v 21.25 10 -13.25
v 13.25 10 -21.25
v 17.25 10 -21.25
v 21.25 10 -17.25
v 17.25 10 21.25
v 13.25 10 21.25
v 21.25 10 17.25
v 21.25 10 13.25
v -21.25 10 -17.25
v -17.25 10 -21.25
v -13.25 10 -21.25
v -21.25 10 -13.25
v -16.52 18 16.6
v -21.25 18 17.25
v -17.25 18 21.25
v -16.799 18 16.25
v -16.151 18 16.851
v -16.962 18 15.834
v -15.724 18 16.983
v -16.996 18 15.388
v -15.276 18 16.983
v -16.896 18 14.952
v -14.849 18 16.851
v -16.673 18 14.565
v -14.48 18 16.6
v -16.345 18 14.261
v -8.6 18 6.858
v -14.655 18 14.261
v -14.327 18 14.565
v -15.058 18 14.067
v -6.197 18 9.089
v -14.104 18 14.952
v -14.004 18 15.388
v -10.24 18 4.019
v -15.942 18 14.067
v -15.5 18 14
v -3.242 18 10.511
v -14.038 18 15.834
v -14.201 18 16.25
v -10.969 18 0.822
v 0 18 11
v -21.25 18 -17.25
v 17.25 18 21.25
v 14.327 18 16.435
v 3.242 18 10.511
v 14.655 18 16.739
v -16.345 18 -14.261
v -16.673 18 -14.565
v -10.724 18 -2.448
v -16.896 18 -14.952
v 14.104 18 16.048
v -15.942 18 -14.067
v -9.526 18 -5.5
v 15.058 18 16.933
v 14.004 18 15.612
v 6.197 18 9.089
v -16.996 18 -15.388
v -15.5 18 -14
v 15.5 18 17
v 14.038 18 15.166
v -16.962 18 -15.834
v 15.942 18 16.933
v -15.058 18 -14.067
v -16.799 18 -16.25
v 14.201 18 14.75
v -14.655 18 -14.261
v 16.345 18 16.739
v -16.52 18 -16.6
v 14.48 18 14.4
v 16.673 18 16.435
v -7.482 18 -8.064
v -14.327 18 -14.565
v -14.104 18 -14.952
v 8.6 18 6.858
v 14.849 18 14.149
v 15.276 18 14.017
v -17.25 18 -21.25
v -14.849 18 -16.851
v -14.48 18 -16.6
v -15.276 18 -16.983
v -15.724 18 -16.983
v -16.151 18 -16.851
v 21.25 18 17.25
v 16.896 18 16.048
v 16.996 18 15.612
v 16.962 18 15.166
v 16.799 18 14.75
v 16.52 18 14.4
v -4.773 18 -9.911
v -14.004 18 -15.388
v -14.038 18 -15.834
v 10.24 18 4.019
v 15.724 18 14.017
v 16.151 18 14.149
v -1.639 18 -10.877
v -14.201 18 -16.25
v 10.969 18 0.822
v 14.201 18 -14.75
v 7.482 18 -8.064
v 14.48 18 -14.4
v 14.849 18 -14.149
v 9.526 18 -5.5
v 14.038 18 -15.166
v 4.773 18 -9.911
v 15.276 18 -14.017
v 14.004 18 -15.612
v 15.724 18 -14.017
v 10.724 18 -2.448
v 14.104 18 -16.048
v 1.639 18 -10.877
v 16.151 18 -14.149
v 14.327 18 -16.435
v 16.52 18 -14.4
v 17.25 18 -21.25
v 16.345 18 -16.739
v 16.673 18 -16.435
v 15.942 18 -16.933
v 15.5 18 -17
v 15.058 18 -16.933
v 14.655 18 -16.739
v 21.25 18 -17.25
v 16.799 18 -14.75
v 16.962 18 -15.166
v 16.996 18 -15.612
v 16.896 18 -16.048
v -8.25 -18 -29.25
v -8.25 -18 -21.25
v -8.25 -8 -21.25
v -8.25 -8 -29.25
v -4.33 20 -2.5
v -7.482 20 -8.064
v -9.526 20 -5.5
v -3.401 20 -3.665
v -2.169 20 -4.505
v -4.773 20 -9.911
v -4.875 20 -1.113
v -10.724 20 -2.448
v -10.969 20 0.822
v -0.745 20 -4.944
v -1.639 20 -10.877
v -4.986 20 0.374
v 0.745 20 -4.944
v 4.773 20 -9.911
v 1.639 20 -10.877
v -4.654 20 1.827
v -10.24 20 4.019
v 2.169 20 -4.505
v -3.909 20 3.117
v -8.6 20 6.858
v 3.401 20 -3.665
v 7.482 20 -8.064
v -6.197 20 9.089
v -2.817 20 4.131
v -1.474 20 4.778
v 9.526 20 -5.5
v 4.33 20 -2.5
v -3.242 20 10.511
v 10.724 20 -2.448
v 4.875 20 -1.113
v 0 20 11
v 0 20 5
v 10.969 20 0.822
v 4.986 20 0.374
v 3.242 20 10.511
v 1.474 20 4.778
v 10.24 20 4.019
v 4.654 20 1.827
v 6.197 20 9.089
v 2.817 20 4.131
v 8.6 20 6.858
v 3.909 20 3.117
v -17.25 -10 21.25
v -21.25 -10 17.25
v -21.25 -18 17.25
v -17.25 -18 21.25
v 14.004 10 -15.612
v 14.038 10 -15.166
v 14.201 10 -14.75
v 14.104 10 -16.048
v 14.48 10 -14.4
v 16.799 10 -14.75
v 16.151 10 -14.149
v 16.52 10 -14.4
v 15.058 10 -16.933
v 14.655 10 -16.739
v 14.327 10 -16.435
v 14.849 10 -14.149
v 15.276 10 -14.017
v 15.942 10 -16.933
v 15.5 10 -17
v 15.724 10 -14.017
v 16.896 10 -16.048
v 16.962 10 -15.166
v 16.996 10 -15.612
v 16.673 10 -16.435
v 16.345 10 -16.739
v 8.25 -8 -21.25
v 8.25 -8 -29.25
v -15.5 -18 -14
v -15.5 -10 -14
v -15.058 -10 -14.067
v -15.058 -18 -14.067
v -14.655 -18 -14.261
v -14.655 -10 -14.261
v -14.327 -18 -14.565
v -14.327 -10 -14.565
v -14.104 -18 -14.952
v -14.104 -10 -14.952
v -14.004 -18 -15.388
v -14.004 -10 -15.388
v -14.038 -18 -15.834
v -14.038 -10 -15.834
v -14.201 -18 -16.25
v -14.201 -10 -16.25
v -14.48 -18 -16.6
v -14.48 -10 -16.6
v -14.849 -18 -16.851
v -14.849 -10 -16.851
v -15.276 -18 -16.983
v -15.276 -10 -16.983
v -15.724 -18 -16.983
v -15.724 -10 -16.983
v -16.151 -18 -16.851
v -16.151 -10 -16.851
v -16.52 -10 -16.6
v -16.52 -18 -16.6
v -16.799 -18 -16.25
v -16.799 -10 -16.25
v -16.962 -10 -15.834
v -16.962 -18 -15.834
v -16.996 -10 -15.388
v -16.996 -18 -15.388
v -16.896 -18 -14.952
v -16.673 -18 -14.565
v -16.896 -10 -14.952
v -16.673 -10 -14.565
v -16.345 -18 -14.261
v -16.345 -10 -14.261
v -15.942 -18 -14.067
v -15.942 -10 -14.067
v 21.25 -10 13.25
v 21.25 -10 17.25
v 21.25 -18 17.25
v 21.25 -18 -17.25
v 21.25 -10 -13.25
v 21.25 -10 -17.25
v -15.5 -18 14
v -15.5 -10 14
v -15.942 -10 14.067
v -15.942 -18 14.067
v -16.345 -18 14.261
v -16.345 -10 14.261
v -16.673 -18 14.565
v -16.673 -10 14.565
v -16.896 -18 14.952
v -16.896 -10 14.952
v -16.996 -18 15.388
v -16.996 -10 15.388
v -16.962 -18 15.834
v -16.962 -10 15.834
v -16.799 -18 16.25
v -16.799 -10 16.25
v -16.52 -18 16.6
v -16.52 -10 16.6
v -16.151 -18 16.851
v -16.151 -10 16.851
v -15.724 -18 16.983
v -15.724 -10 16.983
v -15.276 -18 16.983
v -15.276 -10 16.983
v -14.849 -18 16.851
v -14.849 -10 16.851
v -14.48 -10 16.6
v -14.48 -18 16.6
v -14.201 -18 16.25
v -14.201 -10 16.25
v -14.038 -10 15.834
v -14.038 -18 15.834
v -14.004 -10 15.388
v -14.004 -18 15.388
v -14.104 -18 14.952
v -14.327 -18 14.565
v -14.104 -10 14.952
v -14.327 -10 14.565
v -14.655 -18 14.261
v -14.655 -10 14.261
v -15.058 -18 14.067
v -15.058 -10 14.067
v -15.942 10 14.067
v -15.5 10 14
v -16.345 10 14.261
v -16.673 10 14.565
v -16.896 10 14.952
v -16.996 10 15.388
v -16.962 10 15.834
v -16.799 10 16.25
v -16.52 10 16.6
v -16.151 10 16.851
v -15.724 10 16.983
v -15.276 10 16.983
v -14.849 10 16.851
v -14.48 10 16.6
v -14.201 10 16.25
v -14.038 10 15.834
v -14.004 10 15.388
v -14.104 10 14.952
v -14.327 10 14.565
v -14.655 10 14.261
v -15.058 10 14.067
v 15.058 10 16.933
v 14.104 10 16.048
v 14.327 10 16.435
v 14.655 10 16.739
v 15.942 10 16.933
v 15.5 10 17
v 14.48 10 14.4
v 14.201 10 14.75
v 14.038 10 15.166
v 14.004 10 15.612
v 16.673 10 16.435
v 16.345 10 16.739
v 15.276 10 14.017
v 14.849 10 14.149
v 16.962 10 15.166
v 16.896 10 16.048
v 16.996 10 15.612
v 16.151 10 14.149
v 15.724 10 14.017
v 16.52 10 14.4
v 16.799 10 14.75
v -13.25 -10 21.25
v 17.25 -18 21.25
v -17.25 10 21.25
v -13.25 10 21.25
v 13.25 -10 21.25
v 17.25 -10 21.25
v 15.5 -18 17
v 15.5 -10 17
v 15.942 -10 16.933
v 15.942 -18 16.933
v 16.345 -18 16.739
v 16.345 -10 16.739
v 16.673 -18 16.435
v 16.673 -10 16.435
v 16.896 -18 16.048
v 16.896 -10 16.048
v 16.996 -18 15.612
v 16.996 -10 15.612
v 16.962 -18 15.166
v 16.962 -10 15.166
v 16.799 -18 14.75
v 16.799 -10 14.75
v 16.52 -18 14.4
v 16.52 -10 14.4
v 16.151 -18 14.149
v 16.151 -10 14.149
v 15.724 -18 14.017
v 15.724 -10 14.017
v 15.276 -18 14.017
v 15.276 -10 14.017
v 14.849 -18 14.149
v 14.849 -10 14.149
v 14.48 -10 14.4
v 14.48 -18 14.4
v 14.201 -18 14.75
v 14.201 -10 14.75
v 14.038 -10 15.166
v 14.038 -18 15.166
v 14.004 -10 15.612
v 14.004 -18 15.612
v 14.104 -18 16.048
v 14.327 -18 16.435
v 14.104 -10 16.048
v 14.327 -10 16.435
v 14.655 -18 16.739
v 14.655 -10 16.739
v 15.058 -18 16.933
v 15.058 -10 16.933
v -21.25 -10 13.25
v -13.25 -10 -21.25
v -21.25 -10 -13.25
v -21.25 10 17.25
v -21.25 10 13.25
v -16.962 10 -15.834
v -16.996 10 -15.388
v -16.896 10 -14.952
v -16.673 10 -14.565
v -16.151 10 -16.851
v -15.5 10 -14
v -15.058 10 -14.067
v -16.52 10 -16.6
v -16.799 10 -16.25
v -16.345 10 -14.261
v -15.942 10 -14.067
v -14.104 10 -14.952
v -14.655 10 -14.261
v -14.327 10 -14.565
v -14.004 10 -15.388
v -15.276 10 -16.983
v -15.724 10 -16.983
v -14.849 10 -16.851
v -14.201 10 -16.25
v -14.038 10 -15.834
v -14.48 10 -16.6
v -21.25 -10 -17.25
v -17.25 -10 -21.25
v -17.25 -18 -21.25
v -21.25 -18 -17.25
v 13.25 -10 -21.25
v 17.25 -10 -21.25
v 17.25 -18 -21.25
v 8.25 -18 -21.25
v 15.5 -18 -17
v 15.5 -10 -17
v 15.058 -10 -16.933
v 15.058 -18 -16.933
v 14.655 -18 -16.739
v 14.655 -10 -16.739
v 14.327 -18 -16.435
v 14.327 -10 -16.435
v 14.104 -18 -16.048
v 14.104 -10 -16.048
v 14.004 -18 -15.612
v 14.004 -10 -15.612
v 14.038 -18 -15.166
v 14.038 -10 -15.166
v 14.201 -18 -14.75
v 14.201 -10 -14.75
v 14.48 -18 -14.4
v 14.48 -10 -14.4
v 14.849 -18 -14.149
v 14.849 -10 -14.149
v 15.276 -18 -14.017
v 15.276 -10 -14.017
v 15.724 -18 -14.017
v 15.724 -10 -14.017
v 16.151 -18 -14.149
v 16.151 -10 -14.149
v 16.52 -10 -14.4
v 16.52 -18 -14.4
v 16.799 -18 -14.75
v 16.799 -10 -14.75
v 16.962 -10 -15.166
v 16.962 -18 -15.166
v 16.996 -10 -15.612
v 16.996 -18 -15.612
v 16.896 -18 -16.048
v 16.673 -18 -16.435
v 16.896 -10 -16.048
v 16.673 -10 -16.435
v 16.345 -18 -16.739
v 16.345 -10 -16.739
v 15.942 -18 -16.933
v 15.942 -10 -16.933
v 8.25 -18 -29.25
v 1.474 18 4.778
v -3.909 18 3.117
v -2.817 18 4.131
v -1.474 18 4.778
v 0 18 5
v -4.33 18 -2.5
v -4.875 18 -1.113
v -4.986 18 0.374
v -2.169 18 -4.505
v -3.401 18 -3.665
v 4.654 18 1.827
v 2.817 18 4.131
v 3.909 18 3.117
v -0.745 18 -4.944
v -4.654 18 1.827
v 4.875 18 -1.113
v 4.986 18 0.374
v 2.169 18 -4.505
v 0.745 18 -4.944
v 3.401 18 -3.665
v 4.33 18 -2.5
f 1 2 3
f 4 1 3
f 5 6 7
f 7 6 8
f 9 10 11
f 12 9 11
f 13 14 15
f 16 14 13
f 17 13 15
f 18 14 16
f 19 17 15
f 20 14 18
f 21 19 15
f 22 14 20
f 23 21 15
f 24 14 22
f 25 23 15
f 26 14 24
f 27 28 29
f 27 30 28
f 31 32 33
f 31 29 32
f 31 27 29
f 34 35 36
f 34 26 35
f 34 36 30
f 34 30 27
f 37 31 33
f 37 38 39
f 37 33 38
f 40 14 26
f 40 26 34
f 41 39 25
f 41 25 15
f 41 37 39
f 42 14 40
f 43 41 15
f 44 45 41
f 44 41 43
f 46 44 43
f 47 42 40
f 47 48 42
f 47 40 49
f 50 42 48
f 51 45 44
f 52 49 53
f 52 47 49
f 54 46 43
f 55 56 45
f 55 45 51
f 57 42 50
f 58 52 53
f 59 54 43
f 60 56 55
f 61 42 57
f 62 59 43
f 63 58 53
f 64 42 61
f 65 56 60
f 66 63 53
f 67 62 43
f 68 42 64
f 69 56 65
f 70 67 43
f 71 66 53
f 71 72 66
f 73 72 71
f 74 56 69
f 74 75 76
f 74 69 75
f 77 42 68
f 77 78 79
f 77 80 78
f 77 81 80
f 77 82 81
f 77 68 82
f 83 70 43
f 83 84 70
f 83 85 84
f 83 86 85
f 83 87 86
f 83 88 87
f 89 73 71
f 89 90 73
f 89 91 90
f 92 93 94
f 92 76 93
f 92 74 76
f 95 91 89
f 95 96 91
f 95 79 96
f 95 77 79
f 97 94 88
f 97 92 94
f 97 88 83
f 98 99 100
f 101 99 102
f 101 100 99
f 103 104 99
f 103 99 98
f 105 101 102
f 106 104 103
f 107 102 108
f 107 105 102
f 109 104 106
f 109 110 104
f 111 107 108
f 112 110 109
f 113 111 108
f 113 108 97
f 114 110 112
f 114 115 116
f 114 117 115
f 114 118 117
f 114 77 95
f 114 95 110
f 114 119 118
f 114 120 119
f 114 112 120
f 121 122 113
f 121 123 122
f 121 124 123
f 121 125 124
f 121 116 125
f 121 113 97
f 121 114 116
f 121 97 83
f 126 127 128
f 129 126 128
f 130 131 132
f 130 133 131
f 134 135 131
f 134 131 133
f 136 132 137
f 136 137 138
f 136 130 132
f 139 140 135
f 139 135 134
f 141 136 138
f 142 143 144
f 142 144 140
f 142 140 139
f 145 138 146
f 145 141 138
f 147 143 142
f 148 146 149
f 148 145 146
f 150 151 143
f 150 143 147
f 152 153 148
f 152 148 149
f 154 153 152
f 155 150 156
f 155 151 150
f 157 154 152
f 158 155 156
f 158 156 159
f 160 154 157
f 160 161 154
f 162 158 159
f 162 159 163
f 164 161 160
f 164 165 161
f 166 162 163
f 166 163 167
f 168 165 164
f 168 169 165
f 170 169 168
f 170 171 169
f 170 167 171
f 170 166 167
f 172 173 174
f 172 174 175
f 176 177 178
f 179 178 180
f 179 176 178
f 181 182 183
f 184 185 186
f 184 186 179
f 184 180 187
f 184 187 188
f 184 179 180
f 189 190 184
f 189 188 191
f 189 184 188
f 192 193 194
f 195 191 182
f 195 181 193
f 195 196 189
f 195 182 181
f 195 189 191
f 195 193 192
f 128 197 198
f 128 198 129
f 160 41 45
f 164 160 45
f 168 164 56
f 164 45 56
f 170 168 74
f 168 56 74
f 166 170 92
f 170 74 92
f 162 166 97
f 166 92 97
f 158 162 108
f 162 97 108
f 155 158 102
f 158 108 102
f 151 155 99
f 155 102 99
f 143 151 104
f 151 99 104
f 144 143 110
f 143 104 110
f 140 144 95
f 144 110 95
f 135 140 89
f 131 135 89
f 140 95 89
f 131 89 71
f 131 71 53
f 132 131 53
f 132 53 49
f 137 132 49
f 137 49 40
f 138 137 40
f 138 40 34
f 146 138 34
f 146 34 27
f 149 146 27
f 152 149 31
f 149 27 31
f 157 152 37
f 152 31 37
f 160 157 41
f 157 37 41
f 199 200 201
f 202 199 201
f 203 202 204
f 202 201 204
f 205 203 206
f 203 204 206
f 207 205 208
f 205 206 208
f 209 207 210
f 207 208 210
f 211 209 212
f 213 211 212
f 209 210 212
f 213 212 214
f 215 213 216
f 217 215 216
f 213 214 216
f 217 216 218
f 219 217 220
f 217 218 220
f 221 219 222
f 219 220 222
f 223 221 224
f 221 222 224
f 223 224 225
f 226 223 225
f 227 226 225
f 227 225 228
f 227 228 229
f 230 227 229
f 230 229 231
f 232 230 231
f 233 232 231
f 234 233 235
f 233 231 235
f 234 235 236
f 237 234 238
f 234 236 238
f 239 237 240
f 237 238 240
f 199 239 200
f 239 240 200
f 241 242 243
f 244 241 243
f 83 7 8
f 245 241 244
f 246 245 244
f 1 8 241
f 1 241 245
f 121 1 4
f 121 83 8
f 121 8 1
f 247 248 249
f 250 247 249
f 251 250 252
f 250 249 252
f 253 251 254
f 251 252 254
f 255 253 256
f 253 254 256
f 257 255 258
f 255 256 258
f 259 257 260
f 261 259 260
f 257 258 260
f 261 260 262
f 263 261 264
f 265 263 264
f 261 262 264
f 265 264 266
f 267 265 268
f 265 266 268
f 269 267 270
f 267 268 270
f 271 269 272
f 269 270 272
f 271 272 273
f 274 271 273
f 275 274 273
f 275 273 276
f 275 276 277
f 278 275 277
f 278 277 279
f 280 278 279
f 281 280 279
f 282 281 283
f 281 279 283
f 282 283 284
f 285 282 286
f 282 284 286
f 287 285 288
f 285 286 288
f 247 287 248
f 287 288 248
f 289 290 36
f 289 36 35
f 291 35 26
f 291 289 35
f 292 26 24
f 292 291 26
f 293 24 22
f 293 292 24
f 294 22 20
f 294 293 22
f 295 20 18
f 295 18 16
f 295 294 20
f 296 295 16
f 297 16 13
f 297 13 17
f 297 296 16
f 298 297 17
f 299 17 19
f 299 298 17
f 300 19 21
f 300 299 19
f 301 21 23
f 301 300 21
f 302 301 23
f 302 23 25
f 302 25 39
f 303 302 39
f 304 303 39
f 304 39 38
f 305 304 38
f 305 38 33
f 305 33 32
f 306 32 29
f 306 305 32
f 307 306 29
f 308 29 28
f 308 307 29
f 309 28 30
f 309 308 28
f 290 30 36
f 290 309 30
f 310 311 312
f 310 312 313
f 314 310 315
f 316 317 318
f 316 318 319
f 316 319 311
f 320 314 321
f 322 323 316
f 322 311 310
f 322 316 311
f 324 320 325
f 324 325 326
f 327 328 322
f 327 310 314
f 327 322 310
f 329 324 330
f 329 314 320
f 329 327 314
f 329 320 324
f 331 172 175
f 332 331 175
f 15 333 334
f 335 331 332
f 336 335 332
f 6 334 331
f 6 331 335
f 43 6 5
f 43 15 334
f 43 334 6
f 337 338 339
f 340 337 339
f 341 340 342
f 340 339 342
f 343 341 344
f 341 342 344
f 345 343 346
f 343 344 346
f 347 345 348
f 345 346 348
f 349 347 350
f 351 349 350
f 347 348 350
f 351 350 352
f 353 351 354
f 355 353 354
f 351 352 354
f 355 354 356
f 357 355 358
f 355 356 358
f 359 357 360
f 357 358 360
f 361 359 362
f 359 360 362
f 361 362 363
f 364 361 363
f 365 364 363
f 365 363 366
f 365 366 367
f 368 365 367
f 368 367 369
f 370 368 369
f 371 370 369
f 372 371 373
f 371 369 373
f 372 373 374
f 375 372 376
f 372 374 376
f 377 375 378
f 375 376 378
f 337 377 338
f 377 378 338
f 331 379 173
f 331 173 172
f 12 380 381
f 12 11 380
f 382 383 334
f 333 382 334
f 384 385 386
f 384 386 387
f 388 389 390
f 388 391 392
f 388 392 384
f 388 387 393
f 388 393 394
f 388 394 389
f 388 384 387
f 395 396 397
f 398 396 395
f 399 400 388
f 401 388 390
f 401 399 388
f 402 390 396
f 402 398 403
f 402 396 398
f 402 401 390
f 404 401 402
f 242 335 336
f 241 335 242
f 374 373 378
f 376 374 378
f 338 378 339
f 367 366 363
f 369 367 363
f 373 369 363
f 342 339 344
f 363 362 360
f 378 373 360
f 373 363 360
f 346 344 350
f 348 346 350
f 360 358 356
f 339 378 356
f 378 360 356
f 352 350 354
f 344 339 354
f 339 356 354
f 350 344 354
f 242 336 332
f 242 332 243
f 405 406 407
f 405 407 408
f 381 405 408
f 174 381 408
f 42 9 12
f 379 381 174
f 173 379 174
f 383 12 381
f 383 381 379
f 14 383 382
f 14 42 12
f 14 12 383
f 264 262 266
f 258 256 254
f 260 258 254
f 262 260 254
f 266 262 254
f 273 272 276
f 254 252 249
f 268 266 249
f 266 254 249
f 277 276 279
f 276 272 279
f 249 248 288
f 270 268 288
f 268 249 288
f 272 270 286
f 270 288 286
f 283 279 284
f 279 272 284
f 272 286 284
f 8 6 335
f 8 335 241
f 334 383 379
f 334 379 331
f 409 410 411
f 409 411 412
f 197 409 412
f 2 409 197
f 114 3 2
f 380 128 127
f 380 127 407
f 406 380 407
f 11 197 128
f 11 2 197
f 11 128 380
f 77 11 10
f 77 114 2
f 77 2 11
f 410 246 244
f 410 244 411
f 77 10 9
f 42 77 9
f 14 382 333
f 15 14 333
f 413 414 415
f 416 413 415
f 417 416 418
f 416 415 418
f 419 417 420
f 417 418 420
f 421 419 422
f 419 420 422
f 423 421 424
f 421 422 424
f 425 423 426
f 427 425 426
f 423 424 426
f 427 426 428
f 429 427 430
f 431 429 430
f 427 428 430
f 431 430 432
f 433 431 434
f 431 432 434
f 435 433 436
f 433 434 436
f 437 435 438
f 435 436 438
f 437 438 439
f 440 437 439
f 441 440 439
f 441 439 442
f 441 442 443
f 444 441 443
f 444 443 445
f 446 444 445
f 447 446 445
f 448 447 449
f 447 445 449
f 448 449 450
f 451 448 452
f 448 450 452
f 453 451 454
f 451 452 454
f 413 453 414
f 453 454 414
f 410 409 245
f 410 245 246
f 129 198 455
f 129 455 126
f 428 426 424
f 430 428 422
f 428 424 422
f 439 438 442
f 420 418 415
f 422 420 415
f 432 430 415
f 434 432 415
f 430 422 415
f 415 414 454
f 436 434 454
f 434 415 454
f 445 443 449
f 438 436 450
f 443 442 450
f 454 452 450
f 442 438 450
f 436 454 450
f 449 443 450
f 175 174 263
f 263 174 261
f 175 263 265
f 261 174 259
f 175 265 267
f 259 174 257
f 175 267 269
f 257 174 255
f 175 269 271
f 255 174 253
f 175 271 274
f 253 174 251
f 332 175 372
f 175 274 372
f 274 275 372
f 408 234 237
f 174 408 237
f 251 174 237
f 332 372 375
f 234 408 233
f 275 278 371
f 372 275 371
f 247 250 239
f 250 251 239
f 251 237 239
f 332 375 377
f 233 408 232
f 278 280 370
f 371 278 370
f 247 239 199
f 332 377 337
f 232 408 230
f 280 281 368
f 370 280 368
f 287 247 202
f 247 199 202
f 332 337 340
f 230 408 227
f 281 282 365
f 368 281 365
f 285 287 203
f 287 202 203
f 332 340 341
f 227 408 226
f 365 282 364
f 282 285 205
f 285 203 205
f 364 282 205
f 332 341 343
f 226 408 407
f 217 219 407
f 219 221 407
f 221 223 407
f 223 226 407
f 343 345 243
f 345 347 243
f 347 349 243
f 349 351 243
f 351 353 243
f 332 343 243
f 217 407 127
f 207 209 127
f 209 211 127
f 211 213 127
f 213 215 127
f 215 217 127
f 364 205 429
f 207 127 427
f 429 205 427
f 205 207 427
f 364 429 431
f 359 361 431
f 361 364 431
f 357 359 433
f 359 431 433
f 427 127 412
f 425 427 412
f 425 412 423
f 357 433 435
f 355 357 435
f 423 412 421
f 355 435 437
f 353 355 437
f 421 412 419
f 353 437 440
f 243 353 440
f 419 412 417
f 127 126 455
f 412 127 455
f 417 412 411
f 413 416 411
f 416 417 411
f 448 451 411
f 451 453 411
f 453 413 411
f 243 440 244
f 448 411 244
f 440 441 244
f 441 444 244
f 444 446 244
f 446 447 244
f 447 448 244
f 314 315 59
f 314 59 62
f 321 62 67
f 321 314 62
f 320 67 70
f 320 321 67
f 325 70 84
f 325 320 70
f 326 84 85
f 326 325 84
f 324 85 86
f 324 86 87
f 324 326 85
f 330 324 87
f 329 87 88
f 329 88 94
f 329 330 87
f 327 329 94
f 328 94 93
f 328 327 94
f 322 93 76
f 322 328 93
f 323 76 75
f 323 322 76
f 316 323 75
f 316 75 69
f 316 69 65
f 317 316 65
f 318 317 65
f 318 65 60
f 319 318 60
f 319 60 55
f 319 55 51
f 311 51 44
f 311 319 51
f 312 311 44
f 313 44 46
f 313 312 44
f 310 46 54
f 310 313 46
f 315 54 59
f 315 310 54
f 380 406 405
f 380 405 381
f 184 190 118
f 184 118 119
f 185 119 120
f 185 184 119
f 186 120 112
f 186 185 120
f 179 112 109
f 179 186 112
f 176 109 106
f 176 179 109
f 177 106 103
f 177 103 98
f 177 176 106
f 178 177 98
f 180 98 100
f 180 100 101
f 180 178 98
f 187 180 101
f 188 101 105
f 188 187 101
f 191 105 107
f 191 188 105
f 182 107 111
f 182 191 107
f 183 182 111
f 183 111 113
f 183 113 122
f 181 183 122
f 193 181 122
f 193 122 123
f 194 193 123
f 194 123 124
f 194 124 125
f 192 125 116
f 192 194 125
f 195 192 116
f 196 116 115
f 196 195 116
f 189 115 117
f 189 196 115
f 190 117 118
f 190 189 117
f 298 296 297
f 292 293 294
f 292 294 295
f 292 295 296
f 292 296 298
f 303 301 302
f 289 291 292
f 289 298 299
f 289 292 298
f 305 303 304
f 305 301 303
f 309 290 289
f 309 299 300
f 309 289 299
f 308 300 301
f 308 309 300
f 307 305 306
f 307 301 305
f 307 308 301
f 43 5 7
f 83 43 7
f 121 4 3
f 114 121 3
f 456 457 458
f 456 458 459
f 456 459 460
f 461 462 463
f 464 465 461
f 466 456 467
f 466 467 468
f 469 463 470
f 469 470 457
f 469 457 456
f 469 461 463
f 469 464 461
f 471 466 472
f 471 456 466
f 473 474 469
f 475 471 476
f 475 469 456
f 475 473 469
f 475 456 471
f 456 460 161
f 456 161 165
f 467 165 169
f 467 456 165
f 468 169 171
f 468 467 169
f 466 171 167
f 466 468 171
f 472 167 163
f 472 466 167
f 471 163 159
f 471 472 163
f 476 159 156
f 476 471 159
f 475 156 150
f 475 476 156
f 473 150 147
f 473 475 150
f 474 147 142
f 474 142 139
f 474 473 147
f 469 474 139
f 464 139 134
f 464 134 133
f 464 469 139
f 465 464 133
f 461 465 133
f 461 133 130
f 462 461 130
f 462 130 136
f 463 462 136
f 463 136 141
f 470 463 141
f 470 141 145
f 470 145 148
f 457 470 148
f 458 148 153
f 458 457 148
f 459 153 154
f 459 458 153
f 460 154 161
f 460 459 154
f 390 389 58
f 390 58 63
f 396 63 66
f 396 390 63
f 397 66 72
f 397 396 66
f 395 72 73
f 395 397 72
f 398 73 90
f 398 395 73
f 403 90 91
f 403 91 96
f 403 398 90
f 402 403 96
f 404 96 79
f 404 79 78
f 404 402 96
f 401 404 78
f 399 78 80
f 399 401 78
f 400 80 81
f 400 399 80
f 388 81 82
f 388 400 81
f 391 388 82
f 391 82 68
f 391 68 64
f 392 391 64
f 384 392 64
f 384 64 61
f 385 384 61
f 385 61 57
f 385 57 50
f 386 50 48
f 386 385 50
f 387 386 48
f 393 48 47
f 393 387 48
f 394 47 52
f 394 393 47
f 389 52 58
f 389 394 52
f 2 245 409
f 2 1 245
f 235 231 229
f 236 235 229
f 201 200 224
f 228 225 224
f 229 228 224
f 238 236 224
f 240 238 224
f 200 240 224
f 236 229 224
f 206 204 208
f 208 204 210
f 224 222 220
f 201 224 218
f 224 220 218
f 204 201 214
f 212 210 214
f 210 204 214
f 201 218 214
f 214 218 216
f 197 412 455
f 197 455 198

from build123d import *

# Parameters (mm, degrees)
EXTRUDE_1_DEPTH = 10
SKETCH_2_R      = 1.5
EXTRUDE_2_DEPTH = 8
SKETCH_3_W      = 16.5
SKETCH_3_H      = 10
EXTRUDE_3_DEPTH = 8
SKETCH_4_R      = 11
SKETCH_4_R_2    = 5
EXTRUDE_4_DEPTH = 2


with BuildPart() as part:
    # Эскиз1 → Бобышка-Вытянуть1 (new, symmetric)
    with BuildSketch(Plane(origin=(0, 0, 0), x_dir=(1, 0, 0), z_dir=(0, 1, 0))):
        Polygon((-13.25, 21.25), (-21.25, 13.25), (-21.25, -13.25), (-13.25, -21.25), (13.25, -21.25), (21.25, -13.25), (21.25, 13.25), (13.25, 21.25), align=None)
    extrude(amount=EXTRUDE_1_DEPTH, both=True)

    # Эскиз2 → Бобышка-Вытянуть2 (add)
    with BuildSketch(Plane(origin=(0, 10, 0), x_dir=(1, 0, 0), z_dir=(0, 1, 0))):
        Polygon((-17.25, 21.25), (-21.25, 17.25), (-21.25, -17.25), (-17.25, -21.25), (17.25, -21.25), (21.25, -17.25), (21.25, 17.25), (17.25, 21.25), align=None)
        with Locations(Location((-15.5, 15.5, 0), (0, 0, 270))):
            Circle(SKETCH_2_R, mode=Mode.SUBTRACT)
        with Locations(Location((15.5, 15.5, 0), (0, 0, 90))):
            Circle(SKETCH_2_R, mode=Mode.SUBTRACT)
        with Locations(Location((15.5, -15.5, 0), (0, 0, 270))):
            Circle(SKETCH_2_R, mode=Mode.SUBTRACT)
        with Locations(Location((-15.5, -15.5, 0), (0, 0, 90))):
            Circle(SKETCH_2_R, mode=Mode.SUBTRACT)
    extrude_2 = extrude(amount=EXTRUDE_2_DEPTH)

    # Зеркальное отражение1: Бобышка-Вытянуть2 across plane
    add(extrude_2.mirror(Plane.ZX))

    # Эскиз3 → Бобышка-Вытянуть3 (add)
    with BuildSketch(Plane(origin=(0, 0, -21.25), x_dir=(-1, 0, 0), z_dir=(0, 0, -1))):
        with Locations((0, -13)):
            Rectangle(SKETCH_3_W, SKETCH_3_H)
    extrude(amount=EXTRUDE_3_DEPTH)

    # Эскиз4 → Бобышка-Вытянуть4 (add)
    with BuildSketch(Plane(origin=(0, 18, 0), x_dir=(1, 0, 0), z_dir=(0, 1, 0))):
        with Locations(Location((0, 0, 0), (0, 0, 270))):
            Circle(SKETCH_4_R)
        with Locations(Location((0, 0, 0), (0, 0, 270))):
            Circle(SKETCH_4_R_2, mode=Mode.SUBTRACT)
    extrude(amount=EXTRUDE_4_DEPTH)


solid = part.part
